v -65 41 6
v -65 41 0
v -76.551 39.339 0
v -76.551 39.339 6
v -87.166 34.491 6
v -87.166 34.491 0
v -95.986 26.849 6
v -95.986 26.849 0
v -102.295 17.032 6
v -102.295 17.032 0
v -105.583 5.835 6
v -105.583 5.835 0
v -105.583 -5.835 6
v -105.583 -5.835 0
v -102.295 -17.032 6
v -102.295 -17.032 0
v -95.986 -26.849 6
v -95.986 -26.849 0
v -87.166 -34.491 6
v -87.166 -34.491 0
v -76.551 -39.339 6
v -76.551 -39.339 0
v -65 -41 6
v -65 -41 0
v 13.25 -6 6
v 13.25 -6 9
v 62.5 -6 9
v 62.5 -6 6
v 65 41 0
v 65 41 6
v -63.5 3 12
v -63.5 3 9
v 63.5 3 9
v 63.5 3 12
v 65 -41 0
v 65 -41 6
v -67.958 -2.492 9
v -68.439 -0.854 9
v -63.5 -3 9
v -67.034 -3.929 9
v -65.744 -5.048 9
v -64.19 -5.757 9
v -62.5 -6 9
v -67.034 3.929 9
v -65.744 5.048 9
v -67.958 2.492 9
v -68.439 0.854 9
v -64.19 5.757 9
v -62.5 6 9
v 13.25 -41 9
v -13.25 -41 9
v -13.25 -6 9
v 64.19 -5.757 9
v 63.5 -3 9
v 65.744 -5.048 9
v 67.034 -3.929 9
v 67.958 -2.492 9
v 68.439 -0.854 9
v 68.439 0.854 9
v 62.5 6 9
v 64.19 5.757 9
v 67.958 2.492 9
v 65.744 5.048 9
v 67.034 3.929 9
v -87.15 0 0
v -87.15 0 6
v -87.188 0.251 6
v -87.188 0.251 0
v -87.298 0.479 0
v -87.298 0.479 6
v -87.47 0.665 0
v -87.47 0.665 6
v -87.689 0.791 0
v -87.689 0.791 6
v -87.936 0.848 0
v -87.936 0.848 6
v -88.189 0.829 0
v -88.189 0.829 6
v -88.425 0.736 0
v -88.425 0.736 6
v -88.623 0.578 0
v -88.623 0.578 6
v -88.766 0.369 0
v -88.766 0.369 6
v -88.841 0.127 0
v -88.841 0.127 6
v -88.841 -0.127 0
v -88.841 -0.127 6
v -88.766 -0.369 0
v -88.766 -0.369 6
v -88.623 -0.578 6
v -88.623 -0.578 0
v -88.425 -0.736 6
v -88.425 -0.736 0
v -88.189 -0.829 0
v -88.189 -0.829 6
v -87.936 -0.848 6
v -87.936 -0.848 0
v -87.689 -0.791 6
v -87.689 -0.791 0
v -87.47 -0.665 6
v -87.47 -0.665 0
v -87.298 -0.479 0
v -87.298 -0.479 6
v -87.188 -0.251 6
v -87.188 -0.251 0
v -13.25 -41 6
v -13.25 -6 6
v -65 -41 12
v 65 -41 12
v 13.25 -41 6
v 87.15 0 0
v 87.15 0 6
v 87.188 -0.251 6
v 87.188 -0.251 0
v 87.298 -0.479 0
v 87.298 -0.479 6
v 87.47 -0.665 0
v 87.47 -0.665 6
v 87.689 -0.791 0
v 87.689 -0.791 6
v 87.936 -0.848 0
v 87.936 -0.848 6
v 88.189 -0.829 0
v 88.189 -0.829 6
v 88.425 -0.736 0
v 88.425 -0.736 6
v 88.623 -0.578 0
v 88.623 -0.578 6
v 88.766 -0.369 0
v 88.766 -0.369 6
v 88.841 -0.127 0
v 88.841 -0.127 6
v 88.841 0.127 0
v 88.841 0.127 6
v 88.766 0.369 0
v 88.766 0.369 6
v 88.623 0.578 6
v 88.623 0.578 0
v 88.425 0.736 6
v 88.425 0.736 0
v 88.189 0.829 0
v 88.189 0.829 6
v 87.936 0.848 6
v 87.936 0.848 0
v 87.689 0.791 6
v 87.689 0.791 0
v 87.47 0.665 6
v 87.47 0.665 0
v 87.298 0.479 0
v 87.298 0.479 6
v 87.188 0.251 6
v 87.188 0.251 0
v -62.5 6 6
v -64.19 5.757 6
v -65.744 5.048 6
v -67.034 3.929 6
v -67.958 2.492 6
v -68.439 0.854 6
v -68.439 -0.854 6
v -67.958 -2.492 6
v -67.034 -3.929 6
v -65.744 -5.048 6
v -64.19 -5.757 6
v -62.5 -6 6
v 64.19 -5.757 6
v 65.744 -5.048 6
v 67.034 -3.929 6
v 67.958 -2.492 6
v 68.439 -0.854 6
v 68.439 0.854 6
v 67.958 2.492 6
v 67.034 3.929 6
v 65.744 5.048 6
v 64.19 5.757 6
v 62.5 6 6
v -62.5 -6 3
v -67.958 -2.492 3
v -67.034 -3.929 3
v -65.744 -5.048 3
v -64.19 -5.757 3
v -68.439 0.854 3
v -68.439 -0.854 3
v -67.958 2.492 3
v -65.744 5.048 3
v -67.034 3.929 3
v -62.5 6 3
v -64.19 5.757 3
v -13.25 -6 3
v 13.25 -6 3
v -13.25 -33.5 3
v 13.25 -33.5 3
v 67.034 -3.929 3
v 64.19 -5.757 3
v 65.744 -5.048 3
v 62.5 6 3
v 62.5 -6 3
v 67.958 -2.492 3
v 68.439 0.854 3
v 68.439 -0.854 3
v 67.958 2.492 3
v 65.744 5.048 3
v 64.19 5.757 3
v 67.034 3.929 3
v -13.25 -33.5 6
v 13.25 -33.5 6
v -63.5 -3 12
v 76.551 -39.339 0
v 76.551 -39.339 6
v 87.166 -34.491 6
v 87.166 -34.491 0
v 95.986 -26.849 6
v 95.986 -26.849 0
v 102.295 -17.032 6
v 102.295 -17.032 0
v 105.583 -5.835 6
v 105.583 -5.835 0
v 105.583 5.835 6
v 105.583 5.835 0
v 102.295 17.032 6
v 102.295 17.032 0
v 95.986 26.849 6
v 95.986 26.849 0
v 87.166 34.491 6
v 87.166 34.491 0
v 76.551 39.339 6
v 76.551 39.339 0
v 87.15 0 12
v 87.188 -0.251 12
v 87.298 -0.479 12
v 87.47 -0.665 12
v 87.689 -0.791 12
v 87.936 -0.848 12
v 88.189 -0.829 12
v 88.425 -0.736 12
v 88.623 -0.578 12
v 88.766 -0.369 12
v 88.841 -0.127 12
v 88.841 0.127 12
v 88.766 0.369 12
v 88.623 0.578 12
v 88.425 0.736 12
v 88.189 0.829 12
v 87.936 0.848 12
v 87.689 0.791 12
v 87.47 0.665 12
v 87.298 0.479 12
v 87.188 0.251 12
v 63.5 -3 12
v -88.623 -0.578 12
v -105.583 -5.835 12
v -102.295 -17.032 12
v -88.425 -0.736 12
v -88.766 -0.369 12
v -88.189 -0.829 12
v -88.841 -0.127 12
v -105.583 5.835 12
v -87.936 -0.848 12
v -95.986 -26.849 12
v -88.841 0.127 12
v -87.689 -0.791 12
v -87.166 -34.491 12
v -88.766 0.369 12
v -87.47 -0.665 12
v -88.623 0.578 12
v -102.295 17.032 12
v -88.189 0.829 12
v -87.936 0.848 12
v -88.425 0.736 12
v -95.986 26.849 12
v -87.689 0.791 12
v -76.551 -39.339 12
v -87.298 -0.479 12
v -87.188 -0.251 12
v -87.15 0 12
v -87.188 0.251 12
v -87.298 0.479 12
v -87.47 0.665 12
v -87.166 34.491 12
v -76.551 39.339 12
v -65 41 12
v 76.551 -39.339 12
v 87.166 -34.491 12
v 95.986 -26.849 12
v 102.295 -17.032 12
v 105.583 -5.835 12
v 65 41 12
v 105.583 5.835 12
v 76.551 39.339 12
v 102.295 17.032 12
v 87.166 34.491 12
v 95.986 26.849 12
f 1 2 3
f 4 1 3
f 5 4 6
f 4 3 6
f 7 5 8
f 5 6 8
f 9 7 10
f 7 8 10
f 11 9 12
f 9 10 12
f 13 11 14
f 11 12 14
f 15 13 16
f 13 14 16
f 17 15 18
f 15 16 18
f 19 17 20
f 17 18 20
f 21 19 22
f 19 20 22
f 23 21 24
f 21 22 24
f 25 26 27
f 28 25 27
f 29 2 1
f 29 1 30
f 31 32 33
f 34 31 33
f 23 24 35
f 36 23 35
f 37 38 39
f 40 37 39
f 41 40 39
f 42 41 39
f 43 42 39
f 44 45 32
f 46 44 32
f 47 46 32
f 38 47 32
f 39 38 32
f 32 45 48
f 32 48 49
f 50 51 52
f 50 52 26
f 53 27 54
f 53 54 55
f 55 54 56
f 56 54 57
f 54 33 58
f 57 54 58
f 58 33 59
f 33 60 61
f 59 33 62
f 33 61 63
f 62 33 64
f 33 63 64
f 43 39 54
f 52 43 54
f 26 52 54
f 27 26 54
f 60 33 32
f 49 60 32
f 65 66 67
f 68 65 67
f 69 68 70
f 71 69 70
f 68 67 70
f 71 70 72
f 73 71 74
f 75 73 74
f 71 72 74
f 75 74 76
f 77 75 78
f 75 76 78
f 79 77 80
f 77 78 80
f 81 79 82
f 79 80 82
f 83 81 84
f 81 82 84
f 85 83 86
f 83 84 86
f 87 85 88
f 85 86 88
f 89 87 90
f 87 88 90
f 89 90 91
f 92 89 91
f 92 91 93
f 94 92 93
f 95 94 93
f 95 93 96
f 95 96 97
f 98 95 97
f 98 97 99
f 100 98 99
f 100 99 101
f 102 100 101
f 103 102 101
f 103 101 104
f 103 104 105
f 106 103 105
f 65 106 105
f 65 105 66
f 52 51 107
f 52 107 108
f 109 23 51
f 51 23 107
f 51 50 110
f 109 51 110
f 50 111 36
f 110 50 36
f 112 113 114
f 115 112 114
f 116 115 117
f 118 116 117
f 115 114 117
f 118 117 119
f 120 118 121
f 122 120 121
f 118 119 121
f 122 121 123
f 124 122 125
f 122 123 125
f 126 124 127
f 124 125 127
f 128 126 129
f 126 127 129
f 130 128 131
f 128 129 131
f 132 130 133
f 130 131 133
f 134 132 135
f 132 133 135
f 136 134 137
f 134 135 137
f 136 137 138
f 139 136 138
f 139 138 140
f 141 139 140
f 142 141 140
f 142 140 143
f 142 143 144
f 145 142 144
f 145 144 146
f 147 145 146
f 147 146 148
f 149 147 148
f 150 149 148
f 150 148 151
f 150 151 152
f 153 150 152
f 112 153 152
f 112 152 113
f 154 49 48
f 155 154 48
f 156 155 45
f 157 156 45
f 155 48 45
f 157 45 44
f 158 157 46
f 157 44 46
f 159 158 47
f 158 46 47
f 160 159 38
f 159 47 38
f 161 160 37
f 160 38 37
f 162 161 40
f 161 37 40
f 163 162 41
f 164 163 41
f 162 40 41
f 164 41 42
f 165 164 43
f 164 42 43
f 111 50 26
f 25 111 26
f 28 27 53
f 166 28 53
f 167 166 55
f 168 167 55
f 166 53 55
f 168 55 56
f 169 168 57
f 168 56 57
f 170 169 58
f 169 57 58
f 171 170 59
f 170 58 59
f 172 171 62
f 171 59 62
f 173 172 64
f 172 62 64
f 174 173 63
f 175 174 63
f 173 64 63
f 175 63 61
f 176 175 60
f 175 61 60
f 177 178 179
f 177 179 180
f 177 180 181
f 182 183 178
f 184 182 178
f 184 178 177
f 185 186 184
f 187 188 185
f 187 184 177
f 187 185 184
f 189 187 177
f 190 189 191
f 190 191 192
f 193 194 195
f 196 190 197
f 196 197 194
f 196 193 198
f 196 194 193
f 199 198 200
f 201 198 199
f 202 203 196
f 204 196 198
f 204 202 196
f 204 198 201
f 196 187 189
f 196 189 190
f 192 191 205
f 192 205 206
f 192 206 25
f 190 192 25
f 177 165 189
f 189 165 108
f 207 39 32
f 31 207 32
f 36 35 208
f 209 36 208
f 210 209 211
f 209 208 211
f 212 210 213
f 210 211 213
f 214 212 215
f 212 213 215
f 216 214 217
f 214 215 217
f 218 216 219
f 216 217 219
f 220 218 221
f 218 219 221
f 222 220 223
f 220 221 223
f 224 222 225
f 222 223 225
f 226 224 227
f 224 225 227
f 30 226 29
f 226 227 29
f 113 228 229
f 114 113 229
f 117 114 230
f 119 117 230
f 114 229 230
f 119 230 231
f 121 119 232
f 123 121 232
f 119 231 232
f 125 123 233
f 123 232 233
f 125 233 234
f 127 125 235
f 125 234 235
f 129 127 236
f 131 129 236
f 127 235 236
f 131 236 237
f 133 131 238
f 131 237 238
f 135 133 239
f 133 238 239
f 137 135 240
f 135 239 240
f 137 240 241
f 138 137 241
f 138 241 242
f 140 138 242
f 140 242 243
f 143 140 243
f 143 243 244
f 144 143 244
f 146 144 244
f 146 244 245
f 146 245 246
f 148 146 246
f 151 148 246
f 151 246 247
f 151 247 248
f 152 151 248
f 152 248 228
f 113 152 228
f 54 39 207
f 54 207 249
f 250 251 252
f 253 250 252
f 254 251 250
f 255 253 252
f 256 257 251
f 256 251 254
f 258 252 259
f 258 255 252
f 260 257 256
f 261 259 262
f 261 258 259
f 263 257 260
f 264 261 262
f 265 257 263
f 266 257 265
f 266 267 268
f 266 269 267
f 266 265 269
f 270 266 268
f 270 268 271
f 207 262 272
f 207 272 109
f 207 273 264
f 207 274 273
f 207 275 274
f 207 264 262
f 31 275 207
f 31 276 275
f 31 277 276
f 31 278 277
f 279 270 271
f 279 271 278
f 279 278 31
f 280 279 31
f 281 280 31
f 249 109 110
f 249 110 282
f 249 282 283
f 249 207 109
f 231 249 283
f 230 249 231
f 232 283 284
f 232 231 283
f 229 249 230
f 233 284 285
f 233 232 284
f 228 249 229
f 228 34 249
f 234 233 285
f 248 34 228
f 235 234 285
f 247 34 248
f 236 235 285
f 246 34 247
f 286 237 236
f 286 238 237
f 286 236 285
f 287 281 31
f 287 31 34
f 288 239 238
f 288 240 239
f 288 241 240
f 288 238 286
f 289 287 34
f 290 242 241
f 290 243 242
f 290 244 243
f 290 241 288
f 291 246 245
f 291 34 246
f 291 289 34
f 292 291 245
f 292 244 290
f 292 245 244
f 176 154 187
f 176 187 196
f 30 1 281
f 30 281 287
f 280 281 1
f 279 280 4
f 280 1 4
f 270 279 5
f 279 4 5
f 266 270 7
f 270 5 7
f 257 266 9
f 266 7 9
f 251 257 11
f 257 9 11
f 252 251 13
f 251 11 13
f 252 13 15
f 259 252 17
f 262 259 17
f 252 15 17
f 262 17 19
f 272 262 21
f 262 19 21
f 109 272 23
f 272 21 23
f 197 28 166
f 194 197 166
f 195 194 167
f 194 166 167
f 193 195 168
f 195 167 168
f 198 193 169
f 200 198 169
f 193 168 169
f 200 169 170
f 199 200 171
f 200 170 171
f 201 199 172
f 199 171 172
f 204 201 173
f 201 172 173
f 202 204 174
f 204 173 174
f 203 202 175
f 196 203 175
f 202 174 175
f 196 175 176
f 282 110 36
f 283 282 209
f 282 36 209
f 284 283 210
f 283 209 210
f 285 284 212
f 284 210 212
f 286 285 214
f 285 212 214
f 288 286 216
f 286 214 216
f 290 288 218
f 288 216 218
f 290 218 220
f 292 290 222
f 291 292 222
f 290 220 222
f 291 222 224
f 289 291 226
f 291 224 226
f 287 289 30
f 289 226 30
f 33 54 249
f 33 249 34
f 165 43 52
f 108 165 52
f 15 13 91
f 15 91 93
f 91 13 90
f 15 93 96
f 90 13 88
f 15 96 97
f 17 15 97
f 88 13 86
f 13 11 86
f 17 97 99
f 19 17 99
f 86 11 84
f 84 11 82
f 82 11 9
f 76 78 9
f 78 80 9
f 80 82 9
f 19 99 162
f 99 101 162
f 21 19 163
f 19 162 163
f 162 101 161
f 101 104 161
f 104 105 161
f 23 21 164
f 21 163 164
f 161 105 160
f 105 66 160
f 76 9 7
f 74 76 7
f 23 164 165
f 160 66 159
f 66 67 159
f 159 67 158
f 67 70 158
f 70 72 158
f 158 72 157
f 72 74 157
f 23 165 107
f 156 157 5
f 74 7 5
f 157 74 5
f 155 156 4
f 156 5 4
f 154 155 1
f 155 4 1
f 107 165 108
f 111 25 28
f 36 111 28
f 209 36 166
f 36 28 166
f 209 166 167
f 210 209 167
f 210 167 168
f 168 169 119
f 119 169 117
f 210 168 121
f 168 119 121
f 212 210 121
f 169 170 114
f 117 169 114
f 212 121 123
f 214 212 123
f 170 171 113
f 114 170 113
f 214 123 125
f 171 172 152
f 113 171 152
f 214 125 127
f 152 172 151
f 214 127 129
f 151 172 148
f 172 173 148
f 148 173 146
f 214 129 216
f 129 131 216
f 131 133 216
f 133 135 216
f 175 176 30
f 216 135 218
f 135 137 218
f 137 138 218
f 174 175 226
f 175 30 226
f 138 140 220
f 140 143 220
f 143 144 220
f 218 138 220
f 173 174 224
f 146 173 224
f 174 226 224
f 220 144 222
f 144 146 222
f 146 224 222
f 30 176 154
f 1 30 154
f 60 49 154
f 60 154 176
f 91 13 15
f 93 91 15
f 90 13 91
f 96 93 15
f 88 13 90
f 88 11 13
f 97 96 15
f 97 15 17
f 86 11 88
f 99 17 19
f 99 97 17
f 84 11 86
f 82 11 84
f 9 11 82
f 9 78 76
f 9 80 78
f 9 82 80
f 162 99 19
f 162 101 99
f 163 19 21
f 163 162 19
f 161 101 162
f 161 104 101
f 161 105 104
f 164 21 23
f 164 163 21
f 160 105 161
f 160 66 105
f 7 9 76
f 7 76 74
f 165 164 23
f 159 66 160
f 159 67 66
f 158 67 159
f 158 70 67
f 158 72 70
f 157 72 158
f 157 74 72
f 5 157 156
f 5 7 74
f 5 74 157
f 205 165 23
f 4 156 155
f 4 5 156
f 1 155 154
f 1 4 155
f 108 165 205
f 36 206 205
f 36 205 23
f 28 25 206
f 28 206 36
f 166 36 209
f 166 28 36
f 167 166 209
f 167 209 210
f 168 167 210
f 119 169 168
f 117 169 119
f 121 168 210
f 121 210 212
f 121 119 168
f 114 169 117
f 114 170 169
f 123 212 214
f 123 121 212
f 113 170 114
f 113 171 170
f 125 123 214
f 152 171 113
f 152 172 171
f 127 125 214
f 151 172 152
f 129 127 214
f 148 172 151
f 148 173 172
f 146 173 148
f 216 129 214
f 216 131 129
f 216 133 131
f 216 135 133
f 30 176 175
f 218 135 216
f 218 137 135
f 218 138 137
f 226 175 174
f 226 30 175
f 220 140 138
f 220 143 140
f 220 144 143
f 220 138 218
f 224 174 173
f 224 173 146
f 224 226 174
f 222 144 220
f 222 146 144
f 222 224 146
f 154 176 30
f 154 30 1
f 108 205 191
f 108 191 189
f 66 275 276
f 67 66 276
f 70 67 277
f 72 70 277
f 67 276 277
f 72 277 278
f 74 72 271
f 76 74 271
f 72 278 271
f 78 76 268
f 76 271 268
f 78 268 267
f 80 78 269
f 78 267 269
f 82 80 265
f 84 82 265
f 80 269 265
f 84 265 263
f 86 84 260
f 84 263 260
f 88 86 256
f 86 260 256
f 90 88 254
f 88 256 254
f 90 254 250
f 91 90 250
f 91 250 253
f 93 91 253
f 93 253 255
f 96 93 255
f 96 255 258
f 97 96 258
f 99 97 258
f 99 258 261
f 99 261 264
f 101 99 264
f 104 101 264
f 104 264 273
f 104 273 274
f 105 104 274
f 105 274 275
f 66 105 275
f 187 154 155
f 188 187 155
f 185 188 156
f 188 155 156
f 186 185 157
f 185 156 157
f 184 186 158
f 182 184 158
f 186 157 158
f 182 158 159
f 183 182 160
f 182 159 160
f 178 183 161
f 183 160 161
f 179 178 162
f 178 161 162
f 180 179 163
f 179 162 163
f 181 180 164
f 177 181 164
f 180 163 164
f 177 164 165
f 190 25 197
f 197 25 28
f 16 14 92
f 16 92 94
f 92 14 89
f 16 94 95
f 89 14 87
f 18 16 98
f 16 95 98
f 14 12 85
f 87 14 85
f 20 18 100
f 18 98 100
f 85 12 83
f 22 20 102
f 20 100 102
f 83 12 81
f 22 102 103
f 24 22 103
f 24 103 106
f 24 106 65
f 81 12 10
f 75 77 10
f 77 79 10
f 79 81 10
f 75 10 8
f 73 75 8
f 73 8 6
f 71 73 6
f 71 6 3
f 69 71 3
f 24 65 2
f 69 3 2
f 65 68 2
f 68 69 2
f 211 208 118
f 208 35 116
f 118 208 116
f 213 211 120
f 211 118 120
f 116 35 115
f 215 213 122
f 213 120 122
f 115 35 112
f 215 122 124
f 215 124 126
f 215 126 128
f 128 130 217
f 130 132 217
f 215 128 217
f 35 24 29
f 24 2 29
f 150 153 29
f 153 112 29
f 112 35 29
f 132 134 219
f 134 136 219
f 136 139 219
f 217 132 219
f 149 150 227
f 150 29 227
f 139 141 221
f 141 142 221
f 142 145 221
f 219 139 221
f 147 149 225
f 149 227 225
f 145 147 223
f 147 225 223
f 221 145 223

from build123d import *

# Parameters (mm, degrees)
BOX_BOTTOM_HALF_0_W     = 214
BOX_BOTTOM_HALF_0_H     = 84
BOX_BOTTOM_HALF_0_DEPTH = 7
PAD_DEPTH               = 9
POCKET_DEPTH            = 6
SKETCH002_W             = 26.5
SKETCH002_H             = 35
POCKET001_DEPTH         = 6
SKETCH003_W             = 127
SKETCH003_H             = 6
PAD001_DEPTH            = 3
SKETCH004_R             = 0.85
POCKET002_DEPTH         = 467.245989
POLARPATTERN_COUNT      = 2
SKETCH005_W             = 26.5
SKETCH005_H             = 7.5
PAD002_DEPTH            = 3


with BuildPart() as box_bottom_half_0_body:
    # box_bottom_half_0 → box_bottom_half_0 (new body)
    with BuildSketch(Plane(origin=(-107, -42, -1), x_dir=(1, 0, 0), z_dir=(0, 0, 1))):
        with Locations((107, 42)):
            Rectangle(BOX_BOTTOM_HALF_0_W, BOX_BOTTOM_HALF_0_H)
    extrude(amount=BOX_BOTTOM_HALF_0_DEPTH)


with BuildPart() as body:
    # Sketch → Pad (new body)
    with BuildSketch(Plane.XY):
        with BuildLine():
            ThreePointArc((-65, 41), (-106, 0), (-65, -41))
            Line((-65, -41), (65, -41))
            ThreePointArc((65, -41), (106, 0), (65, 41))
            Line((-65, 41), (65, 41))
        make_face()
    extrude(amount=PAD_DEPTH)

    # Sketch001 (on Face6 of Pad) → Pocket (cut)
    with BuildSketch(Plane.XY.offset(9)):
        with BuildLine():
            ThreePointArc((-62.5, 6), (-68.5, 0), (-62.5, -6))
            Line((-62.5, -6), (62.5, -6))
            ThreePointArc((62.5, -6), (68.5, 0), (62.5, 6))
            Line((-62.5, 6), (62.5, 6))
        make_face()
    extrude(amount=-POCKET_DEPTH, mode=Mode.SUBTRACT)

    # Sketch002 (on Face5 of Pocket) → Pocket001 (cut)
    with BuildSketch(Plane.XY.offset(9)):
        with Locations((0, -23.5)):
            Rectangle(SKETCH002_W, SKETCH002_H)
    extrude(amount=-POCKET001_DEPTH, mode=Mode.SUBTRACT)

    # Sketch003 (on Face5 of Pocket001) → Pad001 (join)
    with BuildSketch(Plane.XY.offset(9)):
        with BuildLine():
            ThreePointArc((-65, 41), (-106, 0), (-65, -41))
            Line((-65, -41), (65, -41))
            ThreePointArc((65, -41), (106, 0), (65, 41))
            Line((-65, 41), (65, 41))
        make_face()
        Rectangle(SKETCH003_W, SKETCH003_H, mode=Mode.SUBTRACT)
    extrude(amount=PAD001_DEPTH)

    # Sketch004 (on Face12 of Pad001) → Pocket002 (cut, through all)
    with BuildSketch(Plane.XY.offset(12)):
        with Locations((-88, 0)):
            Circle(SKETCH004_R)
    pocket002 = extrude(amount=-POCKET002_DEPTH, mode=Mode.SUBTRACT)

    # PolarPattern: Pocket002 ×2 about axis
    polarpattern_axis = Axis((0, 0, 12), (0, 0, 1))
    for i in range(1, POLARPATTERN_COUNT):
        add(pocket002.rotate(polarpattern_axis, i * 360 / POLARPATTERN_COUNT), mode=Mode.SUBTRACT)

    # Sketch005 (on Face10 of PolarPattern) → Pad002 (join)
    with BuildSketch(Plane.XY.offset(3)):
        with Locations((0, -37.25)):
            Rectangle(SKETCH005_W, SKETCH005_H)
    extrude(amount=PAD002_DEPTH)


with BuildPart() as bottom_half_0_body:
    # bottom_half_0 base: copy of Body
    add(body.part)

    # bottom_half_0: intersect box_bottom_half_0 body
    add(box_bottom_half_0_body.part, mode=Mode.INTERSECT)


with BuildPart() as top_half_0_body:
    # top_half_0 base: copy of Body
    add(body.part)

    # top_half_0: cut box_bottom_half_0 body
    add(box_bottom_half_0_body.part, mode=Mode.SUBTRACT)


solid = Compound([bottom_half_0_body.part, top_half_0_body.part])
